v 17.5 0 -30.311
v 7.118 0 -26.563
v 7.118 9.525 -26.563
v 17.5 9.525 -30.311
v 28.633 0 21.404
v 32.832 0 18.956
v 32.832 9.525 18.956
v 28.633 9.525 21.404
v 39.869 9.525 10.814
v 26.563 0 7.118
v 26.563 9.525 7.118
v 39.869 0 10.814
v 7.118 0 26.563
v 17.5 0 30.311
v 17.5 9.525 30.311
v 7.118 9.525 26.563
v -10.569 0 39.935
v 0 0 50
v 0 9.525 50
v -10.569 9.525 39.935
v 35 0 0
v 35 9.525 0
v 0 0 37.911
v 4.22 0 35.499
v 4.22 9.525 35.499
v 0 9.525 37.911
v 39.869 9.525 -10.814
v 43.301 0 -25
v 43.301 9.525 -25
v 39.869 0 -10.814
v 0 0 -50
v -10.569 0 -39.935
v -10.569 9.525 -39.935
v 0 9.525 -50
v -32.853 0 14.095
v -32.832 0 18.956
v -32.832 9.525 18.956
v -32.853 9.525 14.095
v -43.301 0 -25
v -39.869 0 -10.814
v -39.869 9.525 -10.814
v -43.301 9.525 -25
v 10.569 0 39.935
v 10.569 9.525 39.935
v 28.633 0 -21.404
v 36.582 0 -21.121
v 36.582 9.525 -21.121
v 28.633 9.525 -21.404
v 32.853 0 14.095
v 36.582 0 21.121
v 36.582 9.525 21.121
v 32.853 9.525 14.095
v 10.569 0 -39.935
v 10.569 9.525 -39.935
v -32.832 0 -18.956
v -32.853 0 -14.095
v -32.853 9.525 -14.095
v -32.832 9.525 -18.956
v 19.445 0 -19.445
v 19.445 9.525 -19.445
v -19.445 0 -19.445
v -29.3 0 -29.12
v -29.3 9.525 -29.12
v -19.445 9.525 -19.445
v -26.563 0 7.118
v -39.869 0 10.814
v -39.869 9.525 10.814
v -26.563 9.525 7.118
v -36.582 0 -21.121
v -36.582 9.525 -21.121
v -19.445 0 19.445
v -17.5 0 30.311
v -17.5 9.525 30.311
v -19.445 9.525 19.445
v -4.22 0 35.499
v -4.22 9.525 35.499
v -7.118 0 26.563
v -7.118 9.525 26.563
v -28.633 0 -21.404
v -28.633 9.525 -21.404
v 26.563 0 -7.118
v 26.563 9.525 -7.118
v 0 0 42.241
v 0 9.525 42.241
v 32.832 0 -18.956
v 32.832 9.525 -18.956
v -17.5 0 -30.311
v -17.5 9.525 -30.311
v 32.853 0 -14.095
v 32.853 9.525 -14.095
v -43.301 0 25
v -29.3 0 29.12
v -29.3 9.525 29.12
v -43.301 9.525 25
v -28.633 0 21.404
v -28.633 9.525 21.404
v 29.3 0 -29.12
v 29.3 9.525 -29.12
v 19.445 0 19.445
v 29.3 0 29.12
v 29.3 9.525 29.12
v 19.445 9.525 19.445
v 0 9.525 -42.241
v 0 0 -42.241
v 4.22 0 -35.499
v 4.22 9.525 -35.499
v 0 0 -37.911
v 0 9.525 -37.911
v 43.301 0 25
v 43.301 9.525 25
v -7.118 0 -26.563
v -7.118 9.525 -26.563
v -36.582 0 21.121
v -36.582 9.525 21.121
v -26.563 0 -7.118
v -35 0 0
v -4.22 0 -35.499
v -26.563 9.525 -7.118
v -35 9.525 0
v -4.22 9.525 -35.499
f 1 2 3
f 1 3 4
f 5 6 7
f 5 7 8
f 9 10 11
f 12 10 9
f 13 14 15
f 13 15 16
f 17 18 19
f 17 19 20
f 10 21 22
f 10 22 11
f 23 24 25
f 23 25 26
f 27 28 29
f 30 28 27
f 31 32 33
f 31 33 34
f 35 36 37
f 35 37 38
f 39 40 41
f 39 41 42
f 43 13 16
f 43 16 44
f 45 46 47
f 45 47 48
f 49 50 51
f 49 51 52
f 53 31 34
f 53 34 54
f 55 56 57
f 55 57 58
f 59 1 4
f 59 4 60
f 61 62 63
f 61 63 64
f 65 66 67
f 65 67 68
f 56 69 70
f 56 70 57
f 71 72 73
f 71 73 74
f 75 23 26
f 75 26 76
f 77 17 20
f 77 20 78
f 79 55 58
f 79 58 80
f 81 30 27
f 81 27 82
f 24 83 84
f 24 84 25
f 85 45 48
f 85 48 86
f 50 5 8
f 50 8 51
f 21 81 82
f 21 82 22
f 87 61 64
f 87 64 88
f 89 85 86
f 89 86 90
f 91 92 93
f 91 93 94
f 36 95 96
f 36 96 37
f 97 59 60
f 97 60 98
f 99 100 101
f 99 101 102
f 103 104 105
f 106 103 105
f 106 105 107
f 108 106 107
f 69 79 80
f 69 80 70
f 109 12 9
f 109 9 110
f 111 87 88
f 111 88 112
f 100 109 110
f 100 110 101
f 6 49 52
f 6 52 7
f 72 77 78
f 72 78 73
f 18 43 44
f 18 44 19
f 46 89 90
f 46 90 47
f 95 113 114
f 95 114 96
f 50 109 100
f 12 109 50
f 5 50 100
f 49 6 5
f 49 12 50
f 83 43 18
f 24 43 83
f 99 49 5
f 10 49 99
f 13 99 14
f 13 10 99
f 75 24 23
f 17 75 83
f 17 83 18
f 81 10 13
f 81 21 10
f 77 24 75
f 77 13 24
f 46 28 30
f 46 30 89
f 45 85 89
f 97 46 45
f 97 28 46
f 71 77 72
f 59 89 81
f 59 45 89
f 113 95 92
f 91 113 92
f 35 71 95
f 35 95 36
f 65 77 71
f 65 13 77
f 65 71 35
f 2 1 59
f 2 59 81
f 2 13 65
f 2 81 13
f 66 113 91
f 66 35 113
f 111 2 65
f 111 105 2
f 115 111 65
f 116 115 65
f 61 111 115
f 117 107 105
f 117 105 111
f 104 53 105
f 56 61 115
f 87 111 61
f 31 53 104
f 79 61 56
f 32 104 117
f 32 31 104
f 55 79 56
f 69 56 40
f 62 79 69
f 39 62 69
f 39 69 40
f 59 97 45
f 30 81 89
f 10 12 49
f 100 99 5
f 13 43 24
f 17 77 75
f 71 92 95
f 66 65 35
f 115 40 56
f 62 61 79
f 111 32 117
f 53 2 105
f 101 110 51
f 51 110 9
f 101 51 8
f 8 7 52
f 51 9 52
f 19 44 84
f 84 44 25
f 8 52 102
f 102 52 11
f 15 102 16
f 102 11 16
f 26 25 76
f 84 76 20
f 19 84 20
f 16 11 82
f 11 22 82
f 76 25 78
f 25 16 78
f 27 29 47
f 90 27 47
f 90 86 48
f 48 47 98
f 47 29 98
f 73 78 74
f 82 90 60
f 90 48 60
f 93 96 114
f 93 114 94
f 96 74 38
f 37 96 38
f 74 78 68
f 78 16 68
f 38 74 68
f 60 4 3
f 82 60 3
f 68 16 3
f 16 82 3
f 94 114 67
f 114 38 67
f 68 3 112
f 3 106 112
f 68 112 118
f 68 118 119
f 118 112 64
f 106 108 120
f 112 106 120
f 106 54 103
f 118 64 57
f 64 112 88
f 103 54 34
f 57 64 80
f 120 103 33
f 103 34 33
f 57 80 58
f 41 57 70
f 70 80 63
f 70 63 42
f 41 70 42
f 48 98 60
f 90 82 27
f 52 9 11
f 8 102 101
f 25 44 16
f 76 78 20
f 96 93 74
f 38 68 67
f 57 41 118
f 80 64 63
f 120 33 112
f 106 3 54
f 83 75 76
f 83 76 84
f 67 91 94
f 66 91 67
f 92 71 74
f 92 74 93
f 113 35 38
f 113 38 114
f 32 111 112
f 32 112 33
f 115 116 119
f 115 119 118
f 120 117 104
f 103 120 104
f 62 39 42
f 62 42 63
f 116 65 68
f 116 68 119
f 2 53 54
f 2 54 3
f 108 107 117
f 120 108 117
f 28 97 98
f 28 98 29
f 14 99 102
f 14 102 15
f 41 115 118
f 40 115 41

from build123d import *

# Parameters (mm, degrees)
BOSS_EXTRUDE1_DEPTH = 9.525


with BuildPart() as part:
    # Sketch1 → Boss-Extrude1 (new body)
    with BuildSketch(Plane(origin=(0, 0, 0), x_dir=(1, 0, 0), z_dir=(0, 1, 0))):
        Polygon((7.11752374, 26.562960223), (17.5, 30.310889132), (19.445436483, 19.445436483), (29.300117001, 29.120397254), (43.301270189, 25), (39.869062291, 10.81444703), (26.562960223, 7.11752374), (35, 0), (26.562960223, -7.11752374), (39.869062291, -10.81444703), (43.301270189, -25), (29.300117001, -29.120397254), (19.445436483, -19.445436483), (17.5, -30.310889132), (7.11752374, -26.562960223), (10.56894529, -39.934844284), (0, -50), (-10.56894529, -39.934844284), (-7.11752374, -26.562960223), (-17.5, -30.310889132), (-19.445436483, -19.445436483), (-29.300117001, -29.120397254), (-43.301270189, -25), (-39.869062291, -10.81444703), (-26.562960223, -7.11752374), (-35, 0), (-26.562960223, 7.11752374), (-39.869062291, 10.81444703), (-43.301270189, 25), (-29.300117001, 29.120397254), (-19.445436483, 19.445436483), (-17.5, 30.310889132), (-7.11752374, 26.562960223), (-10.56894529, 39.934844284), (0, 50), (10.56894529, 39.934844284), align=None)
        Polygon((0, 42.241346721), (4.219631638, 35.498784797), (0, 37.911261082), (-4.219631638, 35.498784797), align=None, mode=Mode.SUBTRACT)
        Polygon((28.633033619, 21.403700592), (32.832115186, 18.955630541), (32.852665257, 14.095084205), (36.58207935, 21.120673361), align=None, mode=Mode.SUBTRACT)
        Polygon((36.58207935, -21.120673361), (32.852665257, -14.095084205), (32.832115186, -18.955630541), (28.633033619, -21.403700592), align=None, mode=Mode.SUBTRACT)
        Polygon((0, -42.241346721), (4.219631638, -35.498784797), (0, -37.911261082), (-4.219631638, -35.498784797), align=None, mode=Mode.SUBTRACT)
        Polygon((-36.58207935, -21.120673361), (-28.633033619, -21.403700592), (-32.832115186, -18.955630541), (-32.852665257, -14.095084205), align=None, mode=Mode.SUBTRACT)
        Polygon((-36.58207935, 21.120673361), (-32.852665257, 14.095084205), (-32.832115186, 18.955630541), (-28.633033619, 21.403700592), align=None, mode=Mode.SUBTRACT)
    extrude(amount=BOSS_EXTRUDE1_DEPTH)


solid = part.part
